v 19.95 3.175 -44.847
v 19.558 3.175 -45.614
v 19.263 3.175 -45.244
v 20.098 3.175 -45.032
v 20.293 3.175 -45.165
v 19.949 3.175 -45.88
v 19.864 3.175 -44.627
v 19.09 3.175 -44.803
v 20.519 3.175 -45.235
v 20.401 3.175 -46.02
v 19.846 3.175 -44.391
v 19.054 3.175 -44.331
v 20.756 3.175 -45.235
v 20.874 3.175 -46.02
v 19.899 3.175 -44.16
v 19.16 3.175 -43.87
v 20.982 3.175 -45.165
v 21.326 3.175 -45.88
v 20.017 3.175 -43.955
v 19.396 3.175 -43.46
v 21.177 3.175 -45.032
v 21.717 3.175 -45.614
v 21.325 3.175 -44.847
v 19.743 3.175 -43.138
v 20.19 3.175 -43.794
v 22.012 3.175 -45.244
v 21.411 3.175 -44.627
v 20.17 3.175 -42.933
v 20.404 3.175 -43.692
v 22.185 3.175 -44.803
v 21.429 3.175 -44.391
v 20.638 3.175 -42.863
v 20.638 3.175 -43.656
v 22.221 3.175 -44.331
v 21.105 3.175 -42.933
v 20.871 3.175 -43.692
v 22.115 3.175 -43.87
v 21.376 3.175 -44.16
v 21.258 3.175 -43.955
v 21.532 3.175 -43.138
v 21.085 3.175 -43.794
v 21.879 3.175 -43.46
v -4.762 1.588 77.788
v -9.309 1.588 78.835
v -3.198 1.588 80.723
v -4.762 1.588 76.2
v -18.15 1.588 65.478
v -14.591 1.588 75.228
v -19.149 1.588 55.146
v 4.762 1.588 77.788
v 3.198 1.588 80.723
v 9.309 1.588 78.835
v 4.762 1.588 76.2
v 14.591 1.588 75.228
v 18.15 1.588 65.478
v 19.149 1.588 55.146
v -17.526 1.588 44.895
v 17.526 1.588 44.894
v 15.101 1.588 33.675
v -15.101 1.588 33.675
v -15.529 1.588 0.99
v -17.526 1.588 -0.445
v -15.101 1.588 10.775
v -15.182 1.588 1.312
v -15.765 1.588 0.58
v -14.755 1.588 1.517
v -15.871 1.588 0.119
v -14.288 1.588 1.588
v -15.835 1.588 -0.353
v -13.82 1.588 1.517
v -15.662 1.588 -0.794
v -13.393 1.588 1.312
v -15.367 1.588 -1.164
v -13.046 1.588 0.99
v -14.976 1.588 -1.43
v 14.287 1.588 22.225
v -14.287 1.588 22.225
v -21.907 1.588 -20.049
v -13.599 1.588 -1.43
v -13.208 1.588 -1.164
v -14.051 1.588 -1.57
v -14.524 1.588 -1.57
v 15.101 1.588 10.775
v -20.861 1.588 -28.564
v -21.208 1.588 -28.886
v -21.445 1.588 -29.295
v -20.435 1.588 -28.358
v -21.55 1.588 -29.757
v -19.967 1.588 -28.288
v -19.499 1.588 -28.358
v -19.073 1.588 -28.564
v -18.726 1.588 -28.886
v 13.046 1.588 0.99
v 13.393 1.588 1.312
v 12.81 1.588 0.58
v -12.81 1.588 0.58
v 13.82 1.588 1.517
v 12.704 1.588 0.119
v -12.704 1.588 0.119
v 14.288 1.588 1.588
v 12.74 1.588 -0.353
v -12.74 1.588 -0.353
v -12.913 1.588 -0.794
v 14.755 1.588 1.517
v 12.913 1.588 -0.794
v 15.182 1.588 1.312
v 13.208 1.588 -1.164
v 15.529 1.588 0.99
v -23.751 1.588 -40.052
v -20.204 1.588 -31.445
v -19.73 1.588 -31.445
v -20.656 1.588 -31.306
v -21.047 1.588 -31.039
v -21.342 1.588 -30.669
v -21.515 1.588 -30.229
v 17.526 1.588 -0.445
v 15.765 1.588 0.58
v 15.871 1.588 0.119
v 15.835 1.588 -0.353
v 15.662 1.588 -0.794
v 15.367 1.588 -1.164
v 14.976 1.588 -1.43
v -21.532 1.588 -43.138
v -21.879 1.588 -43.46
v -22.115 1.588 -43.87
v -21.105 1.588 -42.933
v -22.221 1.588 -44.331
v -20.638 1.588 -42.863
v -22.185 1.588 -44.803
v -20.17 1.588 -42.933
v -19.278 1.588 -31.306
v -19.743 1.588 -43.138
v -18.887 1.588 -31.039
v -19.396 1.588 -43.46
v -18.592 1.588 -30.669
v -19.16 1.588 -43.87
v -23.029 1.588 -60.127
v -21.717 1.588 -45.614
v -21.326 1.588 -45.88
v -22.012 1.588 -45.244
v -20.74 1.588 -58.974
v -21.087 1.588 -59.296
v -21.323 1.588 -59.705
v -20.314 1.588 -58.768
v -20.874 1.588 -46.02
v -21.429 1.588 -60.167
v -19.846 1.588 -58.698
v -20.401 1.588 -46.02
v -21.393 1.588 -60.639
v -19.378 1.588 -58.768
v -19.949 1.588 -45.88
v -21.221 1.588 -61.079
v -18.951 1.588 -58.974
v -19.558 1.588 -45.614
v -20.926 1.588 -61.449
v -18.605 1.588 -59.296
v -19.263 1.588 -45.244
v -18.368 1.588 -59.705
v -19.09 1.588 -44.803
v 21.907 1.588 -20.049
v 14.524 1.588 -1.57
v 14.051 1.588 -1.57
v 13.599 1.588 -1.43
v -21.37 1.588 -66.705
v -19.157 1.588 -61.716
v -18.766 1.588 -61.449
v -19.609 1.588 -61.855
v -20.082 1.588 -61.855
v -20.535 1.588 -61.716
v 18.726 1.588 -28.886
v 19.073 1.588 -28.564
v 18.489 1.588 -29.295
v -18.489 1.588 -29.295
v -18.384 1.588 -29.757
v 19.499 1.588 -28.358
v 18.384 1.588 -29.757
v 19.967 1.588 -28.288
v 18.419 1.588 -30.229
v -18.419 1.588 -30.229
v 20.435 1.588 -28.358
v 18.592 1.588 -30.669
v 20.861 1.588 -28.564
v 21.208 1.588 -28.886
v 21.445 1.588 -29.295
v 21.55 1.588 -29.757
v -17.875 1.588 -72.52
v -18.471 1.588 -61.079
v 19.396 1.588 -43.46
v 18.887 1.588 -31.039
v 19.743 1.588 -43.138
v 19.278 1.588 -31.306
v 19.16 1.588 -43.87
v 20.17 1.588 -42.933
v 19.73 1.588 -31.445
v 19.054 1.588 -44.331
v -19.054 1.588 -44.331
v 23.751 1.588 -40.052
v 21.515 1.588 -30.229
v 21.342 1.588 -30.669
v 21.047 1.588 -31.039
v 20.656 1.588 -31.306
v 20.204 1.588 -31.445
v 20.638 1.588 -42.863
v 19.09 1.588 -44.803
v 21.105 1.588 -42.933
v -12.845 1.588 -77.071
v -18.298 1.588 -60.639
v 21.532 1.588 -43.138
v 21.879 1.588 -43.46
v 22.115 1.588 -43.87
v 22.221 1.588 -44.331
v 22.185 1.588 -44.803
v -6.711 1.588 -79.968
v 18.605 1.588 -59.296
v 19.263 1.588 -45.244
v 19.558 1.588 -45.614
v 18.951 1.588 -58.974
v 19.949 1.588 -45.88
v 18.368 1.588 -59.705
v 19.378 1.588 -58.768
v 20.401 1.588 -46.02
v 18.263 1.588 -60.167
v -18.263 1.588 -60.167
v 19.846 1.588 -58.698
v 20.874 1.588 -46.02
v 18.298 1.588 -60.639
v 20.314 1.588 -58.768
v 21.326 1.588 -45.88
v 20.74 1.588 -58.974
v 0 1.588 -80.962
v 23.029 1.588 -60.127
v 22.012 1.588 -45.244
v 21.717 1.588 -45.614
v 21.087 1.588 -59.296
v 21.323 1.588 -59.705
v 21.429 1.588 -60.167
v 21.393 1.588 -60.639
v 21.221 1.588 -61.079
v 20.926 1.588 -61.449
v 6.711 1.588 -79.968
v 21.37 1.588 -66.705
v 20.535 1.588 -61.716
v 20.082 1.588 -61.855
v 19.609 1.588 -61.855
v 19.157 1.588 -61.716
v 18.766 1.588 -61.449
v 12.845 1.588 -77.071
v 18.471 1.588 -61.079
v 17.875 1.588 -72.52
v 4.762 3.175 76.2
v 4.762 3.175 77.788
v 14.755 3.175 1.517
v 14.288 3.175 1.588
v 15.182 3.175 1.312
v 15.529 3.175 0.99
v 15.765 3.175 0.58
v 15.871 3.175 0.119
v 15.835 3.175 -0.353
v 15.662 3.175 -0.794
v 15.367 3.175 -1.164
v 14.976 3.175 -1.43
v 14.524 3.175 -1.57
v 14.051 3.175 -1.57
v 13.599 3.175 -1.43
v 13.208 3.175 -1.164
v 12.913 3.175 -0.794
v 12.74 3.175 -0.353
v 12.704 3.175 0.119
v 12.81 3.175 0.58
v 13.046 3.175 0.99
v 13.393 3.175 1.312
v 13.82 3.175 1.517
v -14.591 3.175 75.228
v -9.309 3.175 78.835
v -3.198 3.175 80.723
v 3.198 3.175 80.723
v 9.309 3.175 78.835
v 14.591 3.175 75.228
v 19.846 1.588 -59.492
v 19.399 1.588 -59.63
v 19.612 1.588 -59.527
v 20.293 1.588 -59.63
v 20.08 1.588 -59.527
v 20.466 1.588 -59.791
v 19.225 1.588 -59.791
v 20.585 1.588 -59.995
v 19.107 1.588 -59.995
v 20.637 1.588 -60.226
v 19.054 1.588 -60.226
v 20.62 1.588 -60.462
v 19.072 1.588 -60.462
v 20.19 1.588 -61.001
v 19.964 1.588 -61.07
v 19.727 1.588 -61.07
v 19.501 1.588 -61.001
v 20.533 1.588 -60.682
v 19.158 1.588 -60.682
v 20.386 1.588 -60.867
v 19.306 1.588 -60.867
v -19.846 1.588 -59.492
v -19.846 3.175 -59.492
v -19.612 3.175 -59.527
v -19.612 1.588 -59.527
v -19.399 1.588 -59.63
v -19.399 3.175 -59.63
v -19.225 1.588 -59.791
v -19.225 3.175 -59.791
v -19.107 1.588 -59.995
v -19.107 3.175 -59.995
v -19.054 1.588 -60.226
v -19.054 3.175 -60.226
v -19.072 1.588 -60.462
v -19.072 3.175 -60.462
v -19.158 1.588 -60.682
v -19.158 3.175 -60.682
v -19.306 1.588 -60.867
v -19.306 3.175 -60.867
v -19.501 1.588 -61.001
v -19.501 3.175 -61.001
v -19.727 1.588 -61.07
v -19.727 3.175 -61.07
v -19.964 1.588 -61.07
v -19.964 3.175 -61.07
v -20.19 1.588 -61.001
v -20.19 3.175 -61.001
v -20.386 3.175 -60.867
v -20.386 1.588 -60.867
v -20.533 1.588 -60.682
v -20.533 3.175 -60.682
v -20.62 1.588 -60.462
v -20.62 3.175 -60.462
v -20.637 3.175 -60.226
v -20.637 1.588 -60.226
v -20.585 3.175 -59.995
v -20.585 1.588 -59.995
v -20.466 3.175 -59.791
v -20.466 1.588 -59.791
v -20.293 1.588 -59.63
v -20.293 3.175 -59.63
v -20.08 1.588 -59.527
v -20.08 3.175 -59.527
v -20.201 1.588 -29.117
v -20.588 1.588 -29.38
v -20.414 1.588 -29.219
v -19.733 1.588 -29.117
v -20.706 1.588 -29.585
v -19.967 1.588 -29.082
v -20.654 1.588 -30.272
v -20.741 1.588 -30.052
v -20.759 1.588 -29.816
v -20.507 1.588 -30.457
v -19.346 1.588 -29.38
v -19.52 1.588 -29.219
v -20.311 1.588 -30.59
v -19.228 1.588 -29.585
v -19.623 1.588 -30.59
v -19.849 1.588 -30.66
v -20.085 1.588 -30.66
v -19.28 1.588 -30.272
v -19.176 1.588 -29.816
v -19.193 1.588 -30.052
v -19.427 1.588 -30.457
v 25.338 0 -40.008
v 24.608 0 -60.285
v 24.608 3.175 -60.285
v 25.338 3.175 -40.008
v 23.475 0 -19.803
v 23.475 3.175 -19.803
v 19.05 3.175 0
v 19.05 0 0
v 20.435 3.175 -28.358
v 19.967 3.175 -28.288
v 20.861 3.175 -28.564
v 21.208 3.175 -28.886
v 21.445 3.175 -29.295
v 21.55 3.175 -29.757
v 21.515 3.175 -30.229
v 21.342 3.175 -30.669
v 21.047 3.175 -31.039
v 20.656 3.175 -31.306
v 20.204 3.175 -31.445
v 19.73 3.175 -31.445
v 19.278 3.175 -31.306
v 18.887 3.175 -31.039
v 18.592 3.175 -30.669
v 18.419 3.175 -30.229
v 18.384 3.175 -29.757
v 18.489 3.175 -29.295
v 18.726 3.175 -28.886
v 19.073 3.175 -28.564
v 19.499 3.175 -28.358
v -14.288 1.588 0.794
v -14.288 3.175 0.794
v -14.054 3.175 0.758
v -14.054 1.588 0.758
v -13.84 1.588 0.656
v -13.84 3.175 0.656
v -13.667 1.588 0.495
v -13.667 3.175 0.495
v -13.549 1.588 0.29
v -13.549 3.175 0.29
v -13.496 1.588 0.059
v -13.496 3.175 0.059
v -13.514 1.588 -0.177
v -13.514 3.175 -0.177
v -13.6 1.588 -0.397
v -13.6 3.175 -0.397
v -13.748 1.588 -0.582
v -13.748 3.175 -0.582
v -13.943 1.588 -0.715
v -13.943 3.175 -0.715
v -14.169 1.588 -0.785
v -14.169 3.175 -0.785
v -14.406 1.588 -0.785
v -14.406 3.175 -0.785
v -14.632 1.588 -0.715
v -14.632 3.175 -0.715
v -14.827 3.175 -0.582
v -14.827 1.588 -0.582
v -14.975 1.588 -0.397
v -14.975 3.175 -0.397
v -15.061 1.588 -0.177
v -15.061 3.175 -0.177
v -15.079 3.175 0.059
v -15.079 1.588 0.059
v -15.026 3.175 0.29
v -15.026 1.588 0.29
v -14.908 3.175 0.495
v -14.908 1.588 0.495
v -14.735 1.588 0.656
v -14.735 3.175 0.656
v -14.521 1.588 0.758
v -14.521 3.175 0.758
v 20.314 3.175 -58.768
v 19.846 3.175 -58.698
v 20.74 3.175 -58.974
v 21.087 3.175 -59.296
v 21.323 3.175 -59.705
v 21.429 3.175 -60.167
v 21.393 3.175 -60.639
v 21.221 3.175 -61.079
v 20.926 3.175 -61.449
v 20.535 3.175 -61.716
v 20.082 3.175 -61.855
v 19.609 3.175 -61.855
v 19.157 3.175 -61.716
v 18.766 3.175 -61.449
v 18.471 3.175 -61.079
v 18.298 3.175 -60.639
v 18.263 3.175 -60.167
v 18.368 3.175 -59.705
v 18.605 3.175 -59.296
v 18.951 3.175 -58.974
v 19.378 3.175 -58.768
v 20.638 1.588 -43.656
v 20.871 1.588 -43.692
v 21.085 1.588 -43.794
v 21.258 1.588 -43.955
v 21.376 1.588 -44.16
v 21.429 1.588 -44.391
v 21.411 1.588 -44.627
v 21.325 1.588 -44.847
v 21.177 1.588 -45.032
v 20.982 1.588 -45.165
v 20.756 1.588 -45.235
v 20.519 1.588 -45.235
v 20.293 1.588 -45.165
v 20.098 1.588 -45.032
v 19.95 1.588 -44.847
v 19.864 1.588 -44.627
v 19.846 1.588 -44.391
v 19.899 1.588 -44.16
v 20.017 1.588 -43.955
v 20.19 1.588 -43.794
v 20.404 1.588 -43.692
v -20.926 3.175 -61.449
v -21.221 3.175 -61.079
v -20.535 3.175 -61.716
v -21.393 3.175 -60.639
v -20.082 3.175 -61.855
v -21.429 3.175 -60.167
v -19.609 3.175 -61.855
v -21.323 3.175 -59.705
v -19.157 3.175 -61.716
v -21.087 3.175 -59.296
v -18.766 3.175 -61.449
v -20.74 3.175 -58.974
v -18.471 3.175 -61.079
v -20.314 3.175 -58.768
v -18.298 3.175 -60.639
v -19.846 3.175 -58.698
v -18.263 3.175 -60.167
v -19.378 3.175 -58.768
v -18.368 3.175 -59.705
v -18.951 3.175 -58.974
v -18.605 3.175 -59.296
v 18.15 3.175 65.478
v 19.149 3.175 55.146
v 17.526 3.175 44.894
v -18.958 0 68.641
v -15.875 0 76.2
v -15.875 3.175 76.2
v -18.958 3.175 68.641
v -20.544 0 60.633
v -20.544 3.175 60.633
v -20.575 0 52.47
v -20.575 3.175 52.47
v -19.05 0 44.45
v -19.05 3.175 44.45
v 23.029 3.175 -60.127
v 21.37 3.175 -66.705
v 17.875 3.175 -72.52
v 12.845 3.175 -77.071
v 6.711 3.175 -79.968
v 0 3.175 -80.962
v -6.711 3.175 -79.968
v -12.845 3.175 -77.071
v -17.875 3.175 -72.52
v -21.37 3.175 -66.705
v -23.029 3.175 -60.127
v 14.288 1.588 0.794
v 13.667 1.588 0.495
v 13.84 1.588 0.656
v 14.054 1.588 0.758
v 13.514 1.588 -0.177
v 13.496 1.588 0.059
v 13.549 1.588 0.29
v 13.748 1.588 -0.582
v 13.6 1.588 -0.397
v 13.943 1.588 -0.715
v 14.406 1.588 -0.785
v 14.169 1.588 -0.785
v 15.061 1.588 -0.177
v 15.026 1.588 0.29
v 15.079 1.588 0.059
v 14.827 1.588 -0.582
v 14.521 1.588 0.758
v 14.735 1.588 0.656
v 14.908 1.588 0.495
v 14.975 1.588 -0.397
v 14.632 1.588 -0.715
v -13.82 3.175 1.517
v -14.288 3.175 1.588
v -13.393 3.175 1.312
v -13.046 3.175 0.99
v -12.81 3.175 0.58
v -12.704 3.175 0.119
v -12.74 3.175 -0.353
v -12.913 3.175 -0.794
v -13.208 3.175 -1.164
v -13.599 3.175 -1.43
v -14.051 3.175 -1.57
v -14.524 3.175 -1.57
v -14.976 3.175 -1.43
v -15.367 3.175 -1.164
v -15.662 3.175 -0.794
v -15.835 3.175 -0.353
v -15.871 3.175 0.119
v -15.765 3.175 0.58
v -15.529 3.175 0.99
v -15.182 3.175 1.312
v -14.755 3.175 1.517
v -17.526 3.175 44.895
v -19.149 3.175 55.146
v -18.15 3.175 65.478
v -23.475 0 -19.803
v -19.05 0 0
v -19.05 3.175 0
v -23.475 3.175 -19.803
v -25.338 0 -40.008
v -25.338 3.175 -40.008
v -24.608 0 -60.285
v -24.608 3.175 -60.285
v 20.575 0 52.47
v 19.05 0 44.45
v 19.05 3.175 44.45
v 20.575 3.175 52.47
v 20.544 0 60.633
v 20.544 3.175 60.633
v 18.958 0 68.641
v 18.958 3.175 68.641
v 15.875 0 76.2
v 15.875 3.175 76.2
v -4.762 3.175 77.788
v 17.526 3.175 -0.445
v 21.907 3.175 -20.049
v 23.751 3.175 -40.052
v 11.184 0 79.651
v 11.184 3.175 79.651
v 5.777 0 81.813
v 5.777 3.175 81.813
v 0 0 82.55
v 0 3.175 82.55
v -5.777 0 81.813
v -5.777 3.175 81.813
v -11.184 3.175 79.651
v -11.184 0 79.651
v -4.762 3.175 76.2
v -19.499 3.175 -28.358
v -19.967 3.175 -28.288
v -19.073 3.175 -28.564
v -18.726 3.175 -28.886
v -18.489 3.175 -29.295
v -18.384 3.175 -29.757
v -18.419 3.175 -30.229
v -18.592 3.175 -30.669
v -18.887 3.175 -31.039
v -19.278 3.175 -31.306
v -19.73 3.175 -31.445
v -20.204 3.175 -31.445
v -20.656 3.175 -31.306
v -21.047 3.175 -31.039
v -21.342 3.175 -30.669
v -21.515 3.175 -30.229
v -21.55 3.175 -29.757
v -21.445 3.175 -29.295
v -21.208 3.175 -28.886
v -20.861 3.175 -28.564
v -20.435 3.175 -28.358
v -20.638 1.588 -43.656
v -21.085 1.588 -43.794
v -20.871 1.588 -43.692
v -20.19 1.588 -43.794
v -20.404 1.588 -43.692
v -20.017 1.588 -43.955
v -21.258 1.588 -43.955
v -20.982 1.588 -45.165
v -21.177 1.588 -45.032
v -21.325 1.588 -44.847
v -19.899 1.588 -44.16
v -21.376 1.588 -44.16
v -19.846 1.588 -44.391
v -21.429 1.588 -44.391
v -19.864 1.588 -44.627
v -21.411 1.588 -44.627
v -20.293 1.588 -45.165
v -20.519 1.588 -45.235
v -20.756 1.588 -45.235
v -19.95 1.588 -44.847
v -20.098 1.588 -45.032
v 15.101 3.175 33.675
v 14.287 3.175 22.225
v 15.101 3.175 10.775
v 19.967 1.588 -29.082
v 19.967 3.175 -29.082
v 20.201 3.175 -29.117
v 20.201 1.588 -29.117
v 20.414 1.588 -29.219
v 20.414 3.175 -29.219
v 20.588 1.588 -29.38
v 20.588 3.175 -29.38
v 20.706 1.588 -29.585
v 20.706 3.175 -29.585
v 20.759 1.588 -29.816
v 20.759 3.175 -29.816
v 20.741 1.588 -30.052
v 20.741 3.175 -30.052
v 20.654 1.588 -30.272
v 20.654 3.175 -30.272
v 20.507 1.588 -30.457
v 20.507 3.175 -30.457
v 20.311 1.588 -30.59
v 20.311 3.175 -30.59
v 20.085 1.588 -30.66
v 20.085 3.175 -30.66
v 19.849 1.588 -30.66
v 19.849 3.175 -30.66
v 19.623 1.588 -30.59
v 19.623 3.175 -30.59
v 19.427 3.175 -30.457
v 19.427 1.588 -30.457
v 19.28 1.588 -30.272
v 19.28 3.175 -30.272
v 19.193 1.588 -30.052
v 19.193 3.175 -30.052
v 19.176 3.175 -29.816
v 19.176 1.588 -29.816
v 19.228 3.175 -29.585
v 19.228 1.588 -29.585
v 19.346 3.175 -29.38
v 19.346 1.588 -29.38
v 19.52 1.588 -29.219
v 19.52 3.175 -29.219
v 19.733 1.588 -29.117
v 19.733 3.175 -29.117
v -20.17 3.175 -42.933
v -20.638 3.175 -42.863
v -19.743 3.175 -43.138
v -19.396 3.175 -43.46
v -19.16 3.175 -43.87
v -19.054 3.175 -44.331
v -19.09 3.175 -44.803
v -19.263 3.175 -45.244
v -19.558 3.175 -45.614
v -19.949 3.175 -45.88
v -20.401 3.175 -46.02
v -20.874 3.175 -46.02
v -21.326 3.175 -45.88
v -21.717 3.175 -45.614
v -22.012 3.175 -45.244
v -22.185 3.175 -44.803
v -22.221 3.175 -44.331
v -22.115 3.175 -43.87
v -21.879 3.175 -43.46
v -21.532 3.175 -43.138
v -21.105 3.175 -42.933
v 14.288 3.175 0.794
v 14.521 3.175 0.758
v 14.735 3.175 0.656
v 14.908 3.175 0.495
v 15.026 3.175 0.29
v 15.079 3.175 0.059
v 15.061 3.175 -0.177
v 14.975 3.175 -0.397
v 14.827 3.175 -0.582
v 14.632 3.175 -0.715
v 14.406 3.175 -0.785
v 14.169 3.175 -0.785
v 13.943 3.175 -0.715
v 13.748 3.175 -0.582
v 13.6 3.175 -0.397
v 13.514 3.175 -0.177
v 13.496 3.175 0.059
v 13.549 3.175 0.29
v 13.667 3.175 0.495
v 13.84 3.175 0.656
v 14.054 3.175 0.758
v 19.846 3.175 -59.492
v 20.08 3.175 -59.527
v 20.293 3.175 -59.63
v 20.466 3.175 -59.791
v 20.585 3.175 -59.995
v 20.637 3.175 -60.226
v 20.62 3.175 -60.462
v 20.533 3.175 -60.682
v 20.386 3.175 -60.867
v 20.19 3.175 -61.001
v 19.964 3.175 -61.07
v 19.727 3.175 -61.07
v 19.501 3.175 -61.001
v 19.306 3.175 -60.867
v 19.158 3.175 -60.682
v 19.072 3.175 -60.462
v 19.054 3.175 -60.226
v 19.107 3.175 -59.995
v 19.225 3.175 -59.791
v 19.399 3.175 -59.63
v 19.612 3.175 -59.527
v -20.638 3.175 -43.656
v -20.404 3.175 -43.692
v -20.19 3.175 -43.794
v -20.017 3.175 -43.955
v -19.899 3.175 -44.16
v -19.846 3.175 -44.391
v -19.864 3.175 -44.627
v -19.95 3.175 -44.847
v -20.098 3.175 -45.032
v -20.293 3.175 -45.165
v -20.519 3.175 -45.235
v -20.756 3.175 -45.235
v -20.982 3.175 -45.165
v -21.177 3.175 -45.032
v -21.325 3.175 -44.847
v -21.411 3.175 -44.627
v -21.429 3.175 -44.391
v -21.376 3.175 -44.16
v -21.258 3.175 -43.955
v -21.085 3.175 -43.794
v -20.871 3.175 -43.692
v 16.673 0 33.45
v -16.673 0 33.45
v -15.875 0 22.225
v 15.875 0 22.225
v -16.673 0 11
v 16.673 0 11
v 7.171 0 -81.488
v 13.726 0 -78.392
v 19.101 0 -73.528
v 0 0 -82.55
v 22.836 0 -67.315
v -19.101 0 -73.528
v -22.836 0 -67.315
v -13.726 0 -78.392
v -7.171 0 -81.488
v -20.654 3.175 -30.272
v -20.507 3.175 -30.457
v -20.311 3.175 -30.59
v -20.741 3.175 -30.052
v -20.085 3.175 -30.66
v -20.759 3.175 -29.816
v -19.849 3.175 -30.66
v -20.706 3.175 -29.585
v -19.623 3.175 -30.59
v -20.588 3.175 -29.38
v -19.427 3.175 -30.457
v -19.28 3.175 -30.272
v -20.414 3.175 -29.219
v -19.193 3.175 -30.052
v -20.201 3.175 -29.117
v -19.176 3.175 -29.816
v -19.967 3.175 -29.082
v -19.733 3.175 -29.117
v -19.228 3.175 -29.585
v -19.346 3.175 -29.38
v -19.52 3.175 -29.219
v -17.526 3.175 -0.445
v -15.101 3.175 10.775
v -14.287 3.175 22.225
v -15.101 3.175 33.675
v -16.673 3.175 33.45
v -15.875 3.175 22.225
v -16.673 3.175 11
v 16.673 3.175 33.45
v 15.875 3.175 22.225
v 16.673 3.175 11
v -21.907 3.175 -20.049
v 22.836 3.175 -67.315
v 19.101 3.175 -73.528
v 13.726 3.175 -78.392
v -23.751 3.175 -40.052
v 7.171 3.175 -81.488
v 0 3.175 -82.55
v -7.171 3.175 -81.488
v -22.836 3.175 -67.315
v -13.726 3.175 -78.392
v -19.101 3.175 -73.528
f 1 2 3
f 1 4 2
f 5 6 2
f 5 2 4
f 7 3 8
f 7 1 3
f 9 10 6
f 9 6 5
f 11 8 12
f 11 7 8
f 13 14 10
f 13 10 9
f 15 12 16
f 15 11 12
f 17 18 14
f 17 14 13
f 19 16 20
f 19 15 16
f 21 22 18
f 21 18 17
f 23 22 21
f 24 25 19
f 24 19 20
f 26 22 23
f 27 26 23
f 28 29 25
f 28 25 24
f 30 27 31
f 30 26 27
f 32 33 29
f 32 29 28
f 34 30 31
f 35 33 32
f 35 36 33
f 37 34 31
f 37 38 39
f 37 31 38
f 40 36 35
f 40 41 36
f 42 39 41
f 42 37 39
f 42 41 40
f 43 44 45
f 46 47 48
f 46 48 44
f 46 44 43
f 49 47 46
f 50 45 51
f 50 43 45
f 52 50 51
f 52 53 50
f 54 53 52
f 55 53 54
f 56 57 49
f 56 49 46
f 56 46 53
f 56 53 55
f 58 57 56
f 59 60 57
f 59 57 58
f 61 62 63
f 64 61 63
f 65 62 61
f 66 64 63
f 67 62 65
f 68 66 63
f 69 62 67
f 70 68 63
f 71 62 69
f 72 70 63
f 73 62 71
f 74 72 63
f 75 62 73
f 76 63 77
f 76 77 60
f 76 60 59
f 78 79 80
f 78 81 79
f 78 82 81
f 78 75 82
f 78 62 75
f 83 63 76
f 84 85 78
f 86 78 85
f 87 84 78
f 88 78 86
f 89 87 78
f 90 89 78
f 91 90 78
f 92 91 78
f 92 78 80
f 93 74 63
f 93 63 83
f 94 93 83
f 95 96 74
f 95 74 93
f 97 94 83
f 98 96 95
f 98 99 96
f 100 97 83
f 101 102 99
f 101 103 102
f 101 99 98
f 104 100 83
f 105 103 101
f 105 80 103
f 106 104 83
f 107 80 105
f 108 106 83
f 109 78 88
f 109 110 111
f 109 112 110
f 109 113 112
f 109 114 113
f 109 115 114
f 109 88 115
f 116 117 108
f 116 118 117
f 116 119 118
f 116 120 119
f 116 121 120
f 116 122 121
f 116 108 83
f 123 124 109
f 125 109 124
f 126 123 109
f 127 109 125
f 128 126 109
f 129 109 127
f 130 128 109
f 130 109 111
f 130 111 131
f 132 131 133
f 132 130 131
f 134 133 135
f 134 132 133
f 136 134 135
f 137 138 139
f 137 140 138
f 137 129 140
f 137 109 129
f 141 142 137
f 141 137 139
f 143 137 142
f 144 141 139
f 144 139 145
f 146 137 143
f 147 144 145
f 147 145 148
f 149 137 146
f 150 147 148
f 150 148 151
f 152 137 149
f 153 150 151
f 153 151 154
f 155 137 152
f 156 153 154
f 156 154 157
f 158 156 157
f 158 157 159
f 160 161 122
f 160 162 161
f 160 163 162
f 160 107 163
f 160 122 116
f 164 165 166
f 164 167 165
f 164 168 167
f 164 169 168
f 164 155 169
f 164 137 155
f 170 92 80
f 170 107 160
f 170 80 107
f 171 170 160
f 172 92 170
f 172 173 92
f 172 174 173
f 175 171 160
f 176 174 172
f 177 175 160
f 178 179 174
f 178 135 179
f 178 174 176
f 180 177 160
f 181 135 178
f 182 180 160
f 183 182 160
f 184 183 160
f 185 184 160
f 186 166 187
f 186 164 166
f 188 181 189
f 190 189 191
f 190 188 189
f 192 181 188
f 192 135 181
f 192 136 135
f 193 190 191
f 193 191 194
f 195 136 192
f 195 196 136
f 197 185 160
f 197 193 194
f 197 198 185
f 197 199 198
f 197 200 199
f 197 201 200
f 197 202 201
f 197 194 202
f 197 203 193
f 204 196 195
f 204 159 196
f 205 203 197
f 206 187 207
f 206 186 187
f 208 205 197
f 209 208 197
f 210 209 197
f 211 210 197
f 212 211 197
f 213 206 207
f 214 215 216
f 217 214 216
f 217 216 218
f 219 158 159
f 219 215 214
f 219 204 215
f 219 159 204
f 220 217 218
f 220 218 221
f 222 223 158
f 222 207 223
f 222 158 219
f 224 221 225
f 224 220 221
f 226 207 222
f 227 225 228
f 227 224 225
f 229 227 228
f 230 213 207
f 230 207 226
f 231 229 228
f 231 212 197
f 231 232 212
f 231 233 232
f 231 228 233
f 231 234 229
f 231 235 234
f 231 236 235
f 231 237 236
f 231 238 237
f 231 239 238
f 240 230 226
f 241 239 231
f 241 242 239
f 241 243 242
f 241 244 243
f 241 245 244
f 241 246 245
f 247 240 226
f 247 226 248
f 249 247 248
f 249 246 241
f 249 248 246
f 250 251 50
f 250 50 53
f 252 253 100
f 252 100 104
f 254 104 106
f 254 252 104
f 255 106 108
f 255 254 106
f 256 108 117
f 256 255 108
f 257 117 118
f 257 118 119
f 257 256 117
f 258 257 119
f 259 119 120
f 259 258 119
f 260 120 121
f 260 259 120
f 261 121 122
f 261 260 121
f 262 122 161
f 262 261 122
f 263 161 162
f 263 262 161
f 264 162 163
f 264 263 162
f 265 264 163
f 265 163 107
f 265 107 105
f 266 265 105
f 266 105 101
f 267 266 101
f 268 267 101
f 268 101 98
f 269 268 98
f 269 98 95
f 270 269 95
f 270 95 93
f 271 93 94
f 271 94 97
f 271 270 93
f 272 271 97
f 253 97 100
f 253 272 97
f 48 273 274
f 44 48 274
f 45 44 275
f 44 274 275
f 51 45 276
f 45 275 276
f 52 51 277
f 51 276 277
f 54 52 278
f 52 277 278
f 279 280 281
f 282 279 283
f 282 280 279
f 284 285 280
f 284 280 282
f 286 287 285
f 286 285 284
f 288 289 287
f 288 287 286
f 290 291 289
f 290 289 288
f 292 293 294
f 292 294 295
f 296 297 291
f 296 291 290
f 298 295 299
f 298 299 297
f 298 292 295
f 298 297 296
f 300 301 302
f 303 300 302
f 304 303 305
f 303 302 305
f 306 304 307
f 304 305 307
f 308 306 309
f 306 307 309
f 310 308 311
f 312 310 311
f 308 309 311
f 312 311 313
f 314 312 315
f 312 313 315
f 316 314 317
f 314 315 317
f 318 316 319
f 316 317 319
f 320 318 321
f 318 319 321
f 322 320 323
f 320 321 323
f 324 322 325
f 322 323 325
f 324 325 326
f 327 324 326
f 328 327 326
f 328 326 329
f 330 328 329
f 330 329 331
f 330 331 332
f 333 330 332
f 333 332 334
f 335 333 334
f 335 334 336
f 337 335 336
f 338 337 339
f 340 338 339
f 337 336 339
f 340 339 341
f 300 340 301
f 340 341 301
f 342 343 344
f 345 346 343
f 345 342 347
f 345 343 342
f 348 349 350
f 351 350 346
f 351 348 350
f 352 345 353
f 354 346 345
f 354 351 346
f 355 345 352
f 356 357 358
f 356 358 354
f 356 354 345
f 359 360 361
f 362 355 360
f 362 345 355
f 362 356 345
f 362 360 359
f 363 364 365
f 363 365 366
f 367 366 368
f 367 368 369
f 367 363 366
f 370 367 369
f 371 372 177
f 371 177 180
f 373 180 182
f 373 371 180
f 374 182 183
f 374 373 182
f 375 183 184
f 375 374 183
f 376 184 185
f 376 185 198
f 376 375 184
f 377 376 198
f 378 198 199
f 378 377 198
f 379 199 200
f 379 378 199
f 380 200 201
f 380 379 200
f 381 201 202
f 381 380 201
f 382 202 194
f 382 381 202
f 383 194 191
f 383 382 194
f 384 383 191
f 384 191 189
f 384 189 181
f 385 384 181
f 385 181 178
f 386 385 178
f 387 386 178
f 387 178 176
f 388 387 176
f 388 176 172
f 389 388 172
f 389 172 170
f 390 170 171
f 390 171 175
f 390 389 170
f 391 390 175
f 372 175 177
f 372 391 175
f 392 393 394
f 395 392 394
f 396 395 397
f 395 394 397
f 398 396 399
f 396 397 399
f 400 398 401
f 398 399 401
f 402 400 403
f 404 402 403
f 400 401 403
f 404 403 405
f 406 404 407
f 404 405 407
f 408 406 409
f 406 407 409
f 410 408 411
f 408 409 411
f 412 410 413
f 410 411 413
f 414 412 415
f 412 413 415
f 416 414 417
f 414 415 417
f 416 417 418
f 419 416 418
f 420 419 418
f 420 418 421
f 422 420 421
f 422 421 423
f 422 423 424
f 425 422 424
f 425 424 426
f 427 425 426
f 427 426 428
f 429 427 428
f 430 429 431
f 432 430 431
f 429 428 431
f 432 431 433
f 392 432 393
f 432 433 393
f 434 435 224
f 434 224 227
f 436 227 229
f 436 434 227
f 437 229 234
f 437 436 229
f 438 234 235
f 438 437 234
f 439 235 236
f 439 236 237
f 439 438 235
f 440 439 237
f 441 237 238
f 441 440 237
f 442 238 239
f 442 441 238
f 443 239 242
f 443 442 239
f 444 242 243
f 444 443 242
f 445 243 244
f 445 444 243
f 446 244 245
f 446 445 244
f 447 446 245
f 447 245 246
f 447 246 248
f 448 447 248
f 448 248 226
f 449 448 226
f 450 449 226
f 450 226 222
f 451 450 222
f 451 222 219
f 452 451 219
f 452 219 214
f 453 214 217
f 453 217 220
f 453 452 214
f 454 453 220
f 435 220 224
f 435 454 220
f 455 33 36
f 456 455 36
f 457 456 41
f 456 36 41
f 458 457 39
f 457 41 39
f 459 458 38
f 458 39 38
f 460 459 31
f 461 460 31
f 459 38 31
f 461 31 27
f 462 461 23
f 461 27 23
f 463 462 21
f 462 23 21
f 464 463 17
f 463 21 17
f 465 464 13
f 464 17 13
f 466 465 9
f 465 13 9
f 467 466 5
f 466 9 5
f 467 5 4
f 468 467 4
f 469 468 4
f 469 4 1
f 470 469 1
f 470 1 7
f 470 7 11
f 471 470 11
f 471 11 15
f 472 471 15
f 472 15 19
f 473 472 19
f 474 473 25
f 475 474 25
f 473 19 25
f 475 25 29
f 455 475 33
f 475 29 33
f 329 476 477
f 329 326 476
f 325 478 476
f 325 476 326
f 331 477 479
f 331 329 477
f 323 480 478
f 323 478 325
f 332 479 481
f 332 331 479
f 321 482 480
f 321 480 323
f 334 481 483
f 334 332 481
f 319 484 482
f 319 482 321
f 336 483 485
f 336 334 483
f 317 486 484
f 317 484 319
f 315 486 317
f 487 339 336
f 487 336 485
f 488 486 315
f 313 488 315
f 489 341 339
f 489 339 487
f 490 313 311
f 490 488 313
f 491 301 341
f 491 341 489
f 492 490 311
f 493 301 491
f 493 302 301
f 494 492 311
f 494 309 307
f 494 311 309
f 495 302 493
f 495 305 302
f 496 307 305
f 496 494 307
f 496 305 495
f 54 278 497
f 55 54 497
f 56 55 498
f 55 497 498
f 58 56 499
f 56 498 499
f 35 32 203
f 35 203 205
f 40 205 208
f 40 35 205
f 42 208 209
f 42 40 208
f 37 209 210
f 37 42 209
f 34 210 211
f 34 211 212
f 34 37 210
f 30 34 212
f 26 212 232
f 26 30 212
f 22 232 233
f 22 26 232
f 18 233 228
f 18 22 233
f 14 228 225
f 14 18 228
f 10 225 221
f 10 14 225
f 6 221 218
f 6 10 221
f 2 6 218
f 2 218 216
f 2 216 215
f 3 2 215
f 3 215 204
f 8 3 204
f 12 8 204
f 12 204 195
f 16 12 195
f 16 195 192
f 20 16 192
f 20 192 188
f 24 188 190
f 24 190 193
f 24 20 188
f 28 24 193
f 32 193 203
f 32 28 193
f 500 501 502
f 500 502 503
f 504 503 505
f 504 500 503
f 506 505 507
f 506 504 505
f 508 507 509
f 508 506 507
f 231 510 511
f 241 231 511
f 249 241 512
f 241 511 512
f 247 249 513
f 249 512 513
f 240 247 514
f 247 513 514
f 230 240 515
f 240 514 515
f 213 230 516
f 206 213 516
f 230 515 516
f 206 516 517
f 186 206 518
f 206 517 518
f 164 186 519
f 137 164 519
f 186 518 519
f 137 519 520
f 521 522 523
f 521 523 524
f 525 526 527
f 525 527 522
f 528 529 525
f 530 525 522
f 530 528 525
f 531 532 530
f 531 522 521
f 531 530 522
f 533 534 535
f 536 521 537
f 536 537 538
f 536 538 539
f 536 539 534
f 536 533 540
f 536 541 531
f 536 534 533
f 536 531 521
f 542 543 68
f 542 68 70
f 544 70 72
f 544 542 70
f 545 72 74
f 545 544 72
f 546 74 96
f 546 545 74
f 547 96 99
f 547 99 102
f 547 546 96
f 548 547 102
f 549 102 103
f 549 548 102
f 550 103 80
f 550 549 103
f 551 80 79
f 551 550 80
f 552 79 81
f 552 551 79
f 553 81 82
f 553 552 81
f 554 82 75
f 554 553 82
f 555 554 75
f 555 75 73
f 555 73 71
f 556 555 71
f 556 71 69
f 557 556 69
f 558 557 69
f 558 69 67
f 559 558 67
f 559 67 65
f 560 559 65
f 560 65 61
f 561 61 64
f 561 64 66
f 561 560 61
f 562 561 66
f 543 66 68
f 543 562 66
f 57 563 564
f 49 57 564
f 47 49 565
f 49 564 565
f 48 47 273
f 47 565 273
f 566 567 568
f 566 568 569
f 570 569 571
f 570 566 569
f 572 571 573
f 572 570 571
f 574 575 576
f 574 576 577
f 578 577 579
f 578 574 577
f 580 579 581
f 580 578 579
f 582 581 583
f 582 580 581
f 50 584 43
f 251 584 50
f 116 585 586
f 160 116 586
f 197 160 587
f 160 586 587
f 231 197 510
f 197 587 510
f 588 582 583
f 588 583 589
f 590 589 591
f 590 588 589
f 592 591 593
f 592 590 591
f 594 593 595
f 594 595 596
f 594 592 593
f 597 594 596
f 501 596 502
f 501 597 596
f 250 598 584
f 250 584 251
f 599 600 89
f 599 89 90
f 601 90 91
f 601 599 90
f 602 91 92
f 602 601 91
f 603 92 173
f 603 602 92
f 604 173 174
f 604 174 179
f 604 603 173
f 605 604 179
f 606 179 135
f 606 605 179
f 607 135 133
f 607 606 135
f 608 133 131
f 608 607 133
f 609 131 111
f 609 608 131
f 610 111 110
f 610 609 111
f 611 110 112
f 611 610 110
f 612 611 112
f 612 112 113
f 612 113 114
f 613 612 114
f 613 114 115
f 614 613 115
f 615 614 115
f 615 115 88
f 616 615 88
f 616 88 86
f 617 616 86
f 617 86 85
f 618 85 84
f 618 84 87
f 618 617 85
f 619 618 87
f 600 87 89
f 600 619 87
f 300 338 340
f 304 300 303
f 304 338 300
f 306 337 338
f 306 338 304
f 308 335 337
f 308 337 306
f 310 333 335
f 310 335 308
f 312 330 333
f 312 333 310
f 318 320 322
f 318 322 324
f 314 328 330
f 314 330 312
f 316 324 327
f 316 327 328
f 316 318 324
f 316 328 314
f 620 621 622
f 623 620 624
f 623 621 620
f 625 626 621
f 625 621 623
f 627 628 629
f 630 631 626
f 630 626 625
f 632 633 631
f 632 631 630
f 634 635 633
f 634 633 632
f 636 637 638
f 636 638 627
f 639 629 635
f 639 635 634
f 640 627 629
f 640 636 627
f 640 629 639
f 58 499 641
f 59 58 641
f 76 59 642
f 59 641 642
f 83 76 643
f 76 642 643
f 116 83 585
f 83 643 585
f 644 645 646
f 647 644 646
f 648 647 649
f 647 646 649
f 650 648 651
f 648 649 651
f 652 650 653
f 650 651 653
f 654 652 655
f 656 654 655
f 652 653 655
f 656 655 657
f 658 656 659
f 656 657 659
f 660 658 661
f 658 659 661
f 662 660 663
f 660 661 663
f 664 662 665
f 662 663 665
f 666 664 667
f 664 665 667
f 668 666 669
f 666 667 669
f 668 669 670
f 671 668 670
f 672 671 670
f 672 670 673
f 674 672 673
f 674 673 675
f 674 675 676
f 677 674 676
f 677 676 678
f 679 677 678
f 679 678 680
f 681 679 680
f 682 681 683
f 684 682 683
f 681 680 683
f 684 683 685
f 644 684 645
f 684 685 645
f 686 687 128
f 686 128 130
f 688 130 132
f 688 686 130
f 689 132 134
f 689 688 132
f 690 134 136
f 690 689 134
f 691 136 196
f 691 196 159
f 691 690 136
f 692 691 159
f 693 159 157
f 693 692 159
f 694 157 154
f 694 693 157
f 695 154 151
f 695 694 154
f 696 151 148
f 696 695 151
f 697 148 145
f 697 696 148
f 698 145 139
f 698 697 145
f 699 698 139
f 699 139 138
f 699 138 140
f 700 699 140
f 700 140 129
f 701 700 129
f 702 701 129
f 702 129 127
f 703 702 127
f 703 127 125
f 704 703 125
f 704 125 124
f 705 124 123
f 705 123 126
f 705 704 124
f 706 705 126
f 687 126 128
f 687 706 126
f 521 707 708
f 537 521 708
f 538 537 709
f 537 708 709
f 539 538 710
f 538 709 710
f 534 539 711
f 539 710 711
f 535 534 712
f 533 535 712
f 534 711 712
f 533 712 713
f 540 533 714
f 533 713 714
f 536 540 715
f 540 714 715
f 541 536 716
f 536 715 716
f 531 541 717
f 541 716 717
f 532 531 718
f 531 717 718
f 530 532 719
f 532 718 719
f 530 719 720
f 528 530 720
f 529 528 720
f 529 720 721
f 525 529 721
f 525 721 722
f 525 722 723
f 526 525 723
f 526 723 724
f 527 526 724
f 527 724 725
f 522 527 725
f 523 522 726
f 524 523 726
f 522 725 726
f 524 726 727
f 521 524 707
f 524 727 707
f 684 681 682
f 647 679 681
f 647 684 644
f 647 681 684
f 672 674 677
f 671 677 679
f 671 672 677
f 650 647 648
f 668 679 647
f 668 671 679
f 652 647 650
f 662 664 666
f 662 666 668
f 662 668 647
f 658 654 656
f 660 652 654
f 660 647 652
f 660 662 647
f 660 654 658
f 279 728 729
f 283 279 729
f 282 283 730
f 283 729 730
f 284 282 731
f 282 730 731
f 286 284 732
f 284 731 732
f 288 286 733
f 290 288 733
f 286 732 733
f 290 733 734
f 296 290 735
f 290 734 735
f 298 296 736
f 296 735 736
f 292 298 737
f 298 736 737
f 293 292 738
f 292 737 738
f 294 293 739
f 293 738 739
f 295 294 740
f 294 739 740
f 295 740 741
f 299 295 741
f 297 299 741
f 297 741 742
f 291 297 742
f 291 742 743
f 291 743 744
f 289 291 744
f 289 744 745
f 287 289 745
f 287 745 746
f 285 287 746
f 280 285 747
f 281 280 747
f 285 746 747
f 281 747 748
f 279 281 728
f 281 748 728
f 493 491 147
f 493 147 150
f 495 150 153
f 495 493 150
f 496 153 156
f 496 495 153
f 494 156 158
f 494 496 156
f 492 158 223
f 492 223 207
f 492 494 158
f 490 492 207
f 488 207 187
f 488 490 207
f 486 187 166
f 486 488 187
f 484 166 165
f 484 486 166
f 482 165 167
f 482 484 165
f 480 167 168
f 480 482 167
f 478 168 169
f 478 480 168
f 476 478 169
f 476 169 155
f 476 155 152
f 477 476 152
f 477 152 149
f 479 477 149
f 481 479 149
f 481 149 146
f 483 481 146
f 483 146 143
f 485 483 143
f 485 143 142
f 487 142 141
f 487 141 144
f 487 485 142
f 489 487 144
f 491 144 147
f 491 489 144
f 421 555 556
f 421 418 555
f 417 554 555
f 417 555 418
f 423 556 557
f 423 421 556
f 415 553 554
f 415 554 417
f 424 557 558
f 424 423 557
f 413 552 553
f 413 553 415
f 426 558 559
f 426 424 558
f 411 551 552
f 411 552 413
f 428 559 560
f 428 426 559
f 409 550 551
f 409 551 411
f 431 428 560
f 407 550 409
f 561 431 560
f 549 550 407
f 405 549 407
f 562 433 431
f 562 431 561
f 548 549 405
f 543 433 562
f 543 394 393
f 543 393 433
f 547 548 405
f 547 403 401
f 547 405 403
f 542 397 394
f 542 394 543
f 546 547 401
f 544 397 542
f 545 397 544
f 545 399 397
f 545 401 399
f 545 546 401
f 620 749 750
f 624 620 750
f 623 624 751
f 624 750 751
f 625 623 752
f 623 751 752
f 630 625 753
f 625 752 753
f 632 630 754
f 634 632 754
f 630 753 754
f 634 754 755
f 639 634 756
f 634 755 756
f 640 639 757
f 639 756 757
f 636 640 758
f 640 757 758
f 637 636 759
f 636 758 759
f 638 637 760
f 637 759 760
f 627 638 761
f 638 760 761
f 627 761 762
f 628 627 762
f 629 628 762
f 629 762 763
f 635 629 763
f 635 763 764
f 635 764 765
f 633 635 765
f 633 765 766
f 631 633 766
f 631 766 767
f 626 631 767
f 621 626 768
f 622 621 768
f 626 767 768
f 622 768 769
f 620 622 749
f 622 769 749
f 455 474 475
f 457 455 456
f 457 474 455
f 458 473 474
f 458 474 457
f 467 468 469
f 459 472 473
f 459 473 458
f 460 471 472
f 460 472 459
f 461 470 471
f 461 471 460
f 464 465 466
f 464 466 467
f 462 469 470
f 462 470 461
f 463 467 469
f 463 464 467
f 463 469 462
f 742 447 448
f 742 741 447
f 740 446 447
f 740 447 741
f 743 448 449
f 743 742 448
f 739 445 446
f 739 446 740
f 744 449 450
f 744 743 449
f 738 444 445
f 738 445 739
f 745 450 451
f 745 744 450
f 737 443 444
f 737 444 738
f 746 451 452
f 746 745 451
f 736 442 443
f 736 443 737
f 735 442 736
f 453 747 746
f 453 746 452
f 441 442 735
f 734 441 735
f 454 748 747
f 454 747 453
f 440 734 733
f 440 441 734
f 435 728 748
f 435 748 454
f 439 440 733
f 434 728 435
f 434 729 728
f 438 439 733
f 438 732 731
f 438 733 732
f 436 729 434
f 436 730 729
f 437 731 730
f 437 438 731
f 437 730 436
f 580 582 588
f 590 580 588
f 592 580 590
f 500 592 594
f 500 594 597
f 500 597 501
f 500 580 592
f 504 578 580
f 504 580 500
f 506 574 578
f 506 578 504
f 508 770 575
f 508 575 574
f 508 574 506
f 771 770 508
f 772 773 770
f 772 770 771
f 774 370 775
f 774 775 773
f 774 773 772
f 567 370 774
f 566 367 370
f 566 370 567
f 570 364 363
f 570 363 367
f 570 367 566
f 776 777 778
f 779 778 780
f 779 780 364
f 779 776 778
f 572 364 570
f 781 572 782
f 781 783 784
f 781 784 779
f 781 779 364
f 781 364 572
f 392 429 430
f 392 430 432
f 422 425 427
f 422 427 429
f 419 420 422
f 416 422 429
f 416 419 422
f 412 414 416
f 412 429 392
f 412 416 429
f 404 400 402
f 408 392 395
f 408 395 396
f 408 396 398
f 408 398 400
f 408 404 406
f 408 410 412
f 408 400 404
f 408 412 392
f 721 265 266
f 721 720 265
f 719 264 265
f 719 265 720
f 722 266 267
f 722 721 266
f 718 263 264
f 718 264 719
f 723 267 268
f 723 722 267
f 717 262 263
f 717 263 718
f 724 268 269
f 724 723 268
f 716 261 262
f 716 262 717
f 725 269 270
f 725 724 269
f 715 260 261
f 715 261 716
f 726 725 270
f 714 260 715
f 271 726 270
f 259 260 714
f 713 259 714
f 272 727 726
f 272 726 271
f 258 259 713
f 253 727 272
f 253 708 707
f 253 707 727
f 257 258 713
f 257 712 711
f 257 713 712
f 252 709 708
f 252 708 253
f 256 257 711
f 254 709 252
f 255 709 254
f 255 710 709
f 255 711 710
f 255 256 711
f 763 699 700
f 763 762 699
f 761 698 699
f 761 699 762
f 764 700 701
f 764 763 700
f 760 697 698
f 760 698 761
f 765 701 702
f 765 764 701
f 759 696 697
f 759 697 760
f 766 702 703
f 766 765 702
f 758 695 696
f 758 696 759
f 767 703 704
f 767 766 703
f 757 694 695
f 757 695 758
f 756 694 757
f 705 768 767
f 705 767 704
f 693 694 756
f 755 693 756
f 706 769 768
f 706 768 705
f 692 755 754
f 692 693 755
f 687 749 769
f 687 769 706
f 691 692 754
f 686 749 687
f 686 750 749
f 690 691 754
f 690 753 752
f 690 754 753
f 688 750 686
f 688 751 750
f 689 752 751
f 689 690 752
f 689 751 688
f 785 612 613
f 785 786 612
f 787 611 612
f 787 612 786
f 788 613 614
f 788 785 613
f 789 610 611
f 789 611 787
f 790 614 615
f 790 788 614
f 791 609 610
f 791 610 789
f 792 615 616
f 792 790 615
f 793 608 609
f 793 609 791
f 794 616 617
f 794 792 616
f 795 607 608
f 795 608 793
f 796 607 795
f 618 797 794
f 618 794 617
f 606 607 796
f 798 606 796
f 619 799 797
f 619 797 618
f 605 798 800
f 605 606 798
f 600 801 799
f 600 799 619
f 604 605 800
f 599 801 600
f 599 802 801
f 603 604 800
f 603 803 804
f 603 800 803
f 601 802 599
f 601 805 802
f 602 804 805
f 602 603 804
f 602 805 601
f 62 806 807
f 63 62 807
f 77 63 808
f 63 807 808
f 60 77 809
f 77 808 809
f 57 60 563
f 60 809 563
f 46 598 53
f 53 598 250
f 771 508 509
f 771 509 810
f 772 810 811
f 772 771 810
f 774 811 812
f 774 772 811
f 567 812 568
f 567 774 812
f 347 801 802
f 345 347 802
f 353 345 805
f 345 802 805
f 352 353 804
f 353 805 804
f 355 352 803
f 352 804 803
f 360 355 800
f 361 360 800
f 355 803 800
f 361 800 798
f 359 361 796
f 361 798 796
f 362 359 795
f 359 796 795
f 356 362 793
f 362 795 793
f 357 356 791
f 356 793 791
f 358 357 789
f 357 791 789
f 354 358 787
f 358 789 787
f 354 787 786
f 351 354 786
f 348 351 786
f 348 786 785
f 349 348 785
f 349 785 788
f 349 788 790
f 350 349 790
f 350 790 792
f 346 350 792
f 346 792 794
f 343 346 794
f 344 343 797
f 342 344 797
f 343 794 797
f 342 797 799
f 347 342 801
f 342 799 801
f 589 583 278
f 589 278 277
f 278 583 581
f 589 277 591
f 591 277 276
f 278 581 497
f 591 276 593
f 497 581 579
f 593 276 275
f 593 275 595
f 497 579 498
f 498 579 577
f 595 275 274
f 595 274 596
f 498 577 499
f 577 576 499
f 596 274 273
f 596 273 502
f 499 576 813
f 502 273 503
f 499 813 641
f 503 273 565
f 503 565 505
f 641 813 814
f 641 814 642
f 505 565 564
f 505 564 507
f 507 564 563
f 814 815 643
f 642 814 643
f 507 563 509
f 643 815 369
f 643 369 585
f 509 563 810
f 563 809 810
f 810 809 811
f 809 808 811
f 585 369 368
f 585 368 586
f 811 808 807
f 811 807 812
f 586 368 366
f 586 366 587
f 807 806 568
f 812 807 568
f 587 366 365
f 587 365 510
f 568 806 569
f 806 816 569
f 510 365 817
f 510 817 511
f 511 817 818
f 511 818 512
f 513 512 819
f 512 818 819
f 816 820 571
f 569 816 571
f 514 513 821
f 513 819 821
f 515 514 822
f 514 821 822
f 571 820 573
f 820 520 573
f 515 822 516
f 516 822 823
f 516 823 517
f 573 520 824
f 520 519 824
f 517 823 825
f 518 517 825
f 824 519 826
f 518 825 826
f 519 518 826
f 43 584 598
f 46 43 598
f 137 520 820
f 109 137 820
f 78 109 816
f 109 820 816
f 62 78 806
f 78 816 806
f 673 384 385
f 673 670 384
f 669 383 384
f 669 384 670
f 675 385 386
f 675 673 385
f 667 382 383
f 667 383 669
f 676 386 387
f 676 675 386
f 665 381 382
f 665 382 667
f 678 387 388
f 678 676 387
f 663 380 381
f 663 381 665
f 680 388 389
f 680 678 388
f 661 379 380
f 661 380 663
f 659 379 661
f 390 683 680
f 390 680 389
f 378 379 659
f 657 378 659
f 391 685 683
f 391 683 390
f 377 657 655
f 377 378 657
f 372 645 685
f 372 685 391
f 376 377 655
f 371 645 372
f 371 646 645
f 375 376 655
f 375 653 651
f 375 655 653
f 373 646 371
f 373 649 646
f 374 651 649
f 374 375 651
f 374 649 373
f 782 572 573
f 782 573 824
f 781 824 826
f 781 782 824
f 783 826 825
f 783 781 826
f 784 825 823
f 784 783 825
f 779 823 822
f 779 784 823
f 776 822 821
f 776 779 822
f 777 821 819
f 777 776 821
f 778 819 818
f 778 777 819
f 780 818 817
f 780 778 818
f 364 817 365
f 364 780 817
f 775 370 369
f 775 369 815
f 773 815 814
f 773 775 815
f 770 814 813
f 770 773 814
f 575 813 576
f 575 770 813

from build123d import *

# Parameters (mm, degrees)
BOSS_EXTRUDE1_DEPTH = 3.175
CUT_EXTRUDE1_DEPTH  = 1.5875
SKETCH2_R           = 1.5875
SKETCH2_R_2         = 0.79375
SKETCH2_W           = 9.525
SKETCH2_H           = 1.5875
BOSS_EXTRUDE3_DEPTH = 1.5875


with BuildPart() as part:
    # Sketch1 → Boss-Extrude1 (new body)
    with BuildSketch(Plane(origin=(0, 0, 0), x_dir=(1, 0, 0), z_dir=(0, 1, 0))):
        with BuildLine():
            ThreePointArc((-24.608229426, 60.285411471), (0, 82.55), (24.608229426, 60.285411471))
            ThreePointArc((24.608229426, 60.285411471), (24.729538057, 29.875290817), (19.05, 0))
            ThreePointArc((19.05, 0), (15.875, -22.225), (19.05, -44.45))
            ThreePointArc((19.05, -44.45), (20.544089225, -60.633158922), (15.875, -76.2))
            ThreePointArc((15.875, -76.2), (0, -82.55), (-15.875, -76.2))
            ThreePointArc((-15.875, -76.2), (-20.544089225, -60.633158922), (-19.05, -44.45))
            ThreePointArc((-19.05, -44.45), (-15.875, -22.225), (-19.05, 0))
            ThreePointArc((-19.05, 0), (-24.729538057, 29.875290817), (-24.608229426, 60.285411471))
        make_face()
    extrude(amount=BOSS_EXTRUDE1_DEPTH)

    # Sketch3 → Cut-Extrude1 (cut)
    with BuildSketch(Plane(origin=(0, 3.175, 0), x_dir=(1, 0, 0), z_dir=(0, 1, 0))):
        with BuildLine():
            ThreePointArc((-17.526, -44.8945), (-18.977391367, -60.343827238), (-14.591091342, -75.228336673))
            ThreePointArc((-14.591091342, -75.228336673), (0, -80.9625), (14.591091342, -75.228336673))
            ThreePointArc((14.591091342, -75.228336673), (18.977391367, -60.343827238), (17.526, -44.8945))
            ThreePointArc((17.526, -44.8945), (14.2875, -22.225), (17.526, 0.4445))
            ThreePointArc((17.526, 0.4445), (23.148742676, 30.021037909), (23.028647132, 60.127057357))
            ThreePointArc((23.028647132, 60.127057357), (0, 80.9625), (-23.028647132, 60.127057357))
            ThreePointArc((-23.028647132, 60.127057357), (-23.148742676, 30.021037909), (-17.526, 0.4445))
            ThreePointArc((-17.526, 0.4445), (-14.2875, -22.225), (-17.526, -44.8945))
        make_face()
    extrude(amount=-CUT_EXTRUDE1_DEPTH, mode=Mode.SUBTRACT)

    # Sketch2 → Boss-Extrude3 (add)
    # profile 1 of 9: a face of its own
    with BuildSketch(Plane(origin=(0, 3.175, 0), x_dir=(1, 0, 0), z_dir=(0, 1, 0))):
        with Locations(Location((-19.845729426, 60.285411471, 0), (0, 0, 270))):
            Circle(SKETCH2_R)
        with Locations(Location((-19.845729426, 60.285411471, 0), (0, 0, 270))):
            Circle(SKETCH2_R_2, mode=Mode.SUBTRACT)
    # profile 2 of 9: a face of its own
    with BuildSketch(Plane(origin=(0, 3.175, 0), x_dir=(1, 0, 0), z_dir=(0, 1, 0))):
        with Locations(Location((-20.6375, 44.45, 0), (0, 0, 270))):
            Circle(SKETCH2_R)
        with Locations(Location((-20.6375, 44.45, 0), (0, 0, 270))):
            Circle(SKETCH2_R_2, mode=Mode.SUBTRACT)
    # profile 3 of 9: a face of its own
    with BuildSketch(Plane(origin=(0, 3.175, 0), x_dir=(1, 0, 0), z_dir=(0, 1, 0))):
        with Locations(Location((-19.967038057, 29.875290817, 0), (0, 0, 270))):
            Circle(SKETCH2_R)
        with Locations(Location((-19.967038057, 29.875290817, 0), (0, 0, 270))):
            Circle(SKETCH2_R_2, mode=Mode.SUBTRACT)
    # profile 4 of 9: a face of its own
    with BuildSketch(Plane(origin=(0, 3.175, 0), x_dir=(1, 0, 0), z_dir=(0, 1, 0))):
        with Locations(Location((-14.2875, 0, 0), (0, 0, 270))):
            Circle(SKETCH2_R)
        with Locations(Location((-14.2875, 0, 0), (0, 0, 270))):
            Circle(SKETCH2_R_2, mode=Mode.SUBTRACT)
    # profile 5 of 9: a face of its own
    with BuildSketch(Plane(origin=(0, 3.175, 0), x_dir=(1, 0, 0), z_dir=(0, 1, 0))):
        with Locations(Location((19.845729426, 60.285411471, 0), (0, 0, 270))):
            Circle(SKETCH2_R)
        with Locations(Location((19.845729426, 60.285411471, 0), (0, 0, 270))):
            Circle(SKETCH2_R_2, mode=Mode.SUBTRACT)
    # profile 6 of 9: a face of its own
    with BuildSketch(Plane(origin=(0, 3.175, 0), x_dir=(1, 0, 0), z_dir=(0, 1, 0))):
        with Locations(Location((20.6375, 44.45, 0), (0, 0, 270))):
            Circle(SKETCH2_R)
        with Locations(Location((20.6375, 44.45, 0), (0, 0, 270))):
            Circle(SKETCH2_R_2, mode=Mode.SUBTRACT)
    # profile 7 of 9: a face of its own
    with BuildSketch(Plane(origin=(0, 3.175, 0), x_dir=(1, 0, 0), z_dir=(0, 1, 0))):
        with Locations(Location((19.967038057, 29.875290817, 0), (0, 0, 270))):
            Circle(SKETCH2_R)
        with Locations(Location((19.967038057, 29.875290817, 0), (0, 0, 270))):
            Circle(SKETCH2_R_2, mode=Mode.SUBTRACT)
    # profile 8 of 9: a face of its own
    with BuildSketch(Plane(origin=(0, 3.175, 0), x_dir=(1, 0, 0), z_dir=(0, 1, 0))):
        with Locations(Location((14.2875, 0, 0), (0, 0, 270))):
            Circle(SKETCH2_R)
        with Locations(Location((14.2875, 0, 0), (0, 0, 270))):
            Circle(SKETCH2_R_2, mode=Mode.SUBTRACT)
    # profile 9 of 9: a face of its own
    with BuildSketch(Plane(origin=(0, 3.175, 0), x_dir=(1, 0, 0), z_dir=(0, 1, 0))):
        with Locations((0, -76.99375)):
            Rectangle(SKETCH2_W, SKETCH2_H)
    extrude(amount=-BOSS_EXTRUDE3_DEPTH)


solid = part.part
